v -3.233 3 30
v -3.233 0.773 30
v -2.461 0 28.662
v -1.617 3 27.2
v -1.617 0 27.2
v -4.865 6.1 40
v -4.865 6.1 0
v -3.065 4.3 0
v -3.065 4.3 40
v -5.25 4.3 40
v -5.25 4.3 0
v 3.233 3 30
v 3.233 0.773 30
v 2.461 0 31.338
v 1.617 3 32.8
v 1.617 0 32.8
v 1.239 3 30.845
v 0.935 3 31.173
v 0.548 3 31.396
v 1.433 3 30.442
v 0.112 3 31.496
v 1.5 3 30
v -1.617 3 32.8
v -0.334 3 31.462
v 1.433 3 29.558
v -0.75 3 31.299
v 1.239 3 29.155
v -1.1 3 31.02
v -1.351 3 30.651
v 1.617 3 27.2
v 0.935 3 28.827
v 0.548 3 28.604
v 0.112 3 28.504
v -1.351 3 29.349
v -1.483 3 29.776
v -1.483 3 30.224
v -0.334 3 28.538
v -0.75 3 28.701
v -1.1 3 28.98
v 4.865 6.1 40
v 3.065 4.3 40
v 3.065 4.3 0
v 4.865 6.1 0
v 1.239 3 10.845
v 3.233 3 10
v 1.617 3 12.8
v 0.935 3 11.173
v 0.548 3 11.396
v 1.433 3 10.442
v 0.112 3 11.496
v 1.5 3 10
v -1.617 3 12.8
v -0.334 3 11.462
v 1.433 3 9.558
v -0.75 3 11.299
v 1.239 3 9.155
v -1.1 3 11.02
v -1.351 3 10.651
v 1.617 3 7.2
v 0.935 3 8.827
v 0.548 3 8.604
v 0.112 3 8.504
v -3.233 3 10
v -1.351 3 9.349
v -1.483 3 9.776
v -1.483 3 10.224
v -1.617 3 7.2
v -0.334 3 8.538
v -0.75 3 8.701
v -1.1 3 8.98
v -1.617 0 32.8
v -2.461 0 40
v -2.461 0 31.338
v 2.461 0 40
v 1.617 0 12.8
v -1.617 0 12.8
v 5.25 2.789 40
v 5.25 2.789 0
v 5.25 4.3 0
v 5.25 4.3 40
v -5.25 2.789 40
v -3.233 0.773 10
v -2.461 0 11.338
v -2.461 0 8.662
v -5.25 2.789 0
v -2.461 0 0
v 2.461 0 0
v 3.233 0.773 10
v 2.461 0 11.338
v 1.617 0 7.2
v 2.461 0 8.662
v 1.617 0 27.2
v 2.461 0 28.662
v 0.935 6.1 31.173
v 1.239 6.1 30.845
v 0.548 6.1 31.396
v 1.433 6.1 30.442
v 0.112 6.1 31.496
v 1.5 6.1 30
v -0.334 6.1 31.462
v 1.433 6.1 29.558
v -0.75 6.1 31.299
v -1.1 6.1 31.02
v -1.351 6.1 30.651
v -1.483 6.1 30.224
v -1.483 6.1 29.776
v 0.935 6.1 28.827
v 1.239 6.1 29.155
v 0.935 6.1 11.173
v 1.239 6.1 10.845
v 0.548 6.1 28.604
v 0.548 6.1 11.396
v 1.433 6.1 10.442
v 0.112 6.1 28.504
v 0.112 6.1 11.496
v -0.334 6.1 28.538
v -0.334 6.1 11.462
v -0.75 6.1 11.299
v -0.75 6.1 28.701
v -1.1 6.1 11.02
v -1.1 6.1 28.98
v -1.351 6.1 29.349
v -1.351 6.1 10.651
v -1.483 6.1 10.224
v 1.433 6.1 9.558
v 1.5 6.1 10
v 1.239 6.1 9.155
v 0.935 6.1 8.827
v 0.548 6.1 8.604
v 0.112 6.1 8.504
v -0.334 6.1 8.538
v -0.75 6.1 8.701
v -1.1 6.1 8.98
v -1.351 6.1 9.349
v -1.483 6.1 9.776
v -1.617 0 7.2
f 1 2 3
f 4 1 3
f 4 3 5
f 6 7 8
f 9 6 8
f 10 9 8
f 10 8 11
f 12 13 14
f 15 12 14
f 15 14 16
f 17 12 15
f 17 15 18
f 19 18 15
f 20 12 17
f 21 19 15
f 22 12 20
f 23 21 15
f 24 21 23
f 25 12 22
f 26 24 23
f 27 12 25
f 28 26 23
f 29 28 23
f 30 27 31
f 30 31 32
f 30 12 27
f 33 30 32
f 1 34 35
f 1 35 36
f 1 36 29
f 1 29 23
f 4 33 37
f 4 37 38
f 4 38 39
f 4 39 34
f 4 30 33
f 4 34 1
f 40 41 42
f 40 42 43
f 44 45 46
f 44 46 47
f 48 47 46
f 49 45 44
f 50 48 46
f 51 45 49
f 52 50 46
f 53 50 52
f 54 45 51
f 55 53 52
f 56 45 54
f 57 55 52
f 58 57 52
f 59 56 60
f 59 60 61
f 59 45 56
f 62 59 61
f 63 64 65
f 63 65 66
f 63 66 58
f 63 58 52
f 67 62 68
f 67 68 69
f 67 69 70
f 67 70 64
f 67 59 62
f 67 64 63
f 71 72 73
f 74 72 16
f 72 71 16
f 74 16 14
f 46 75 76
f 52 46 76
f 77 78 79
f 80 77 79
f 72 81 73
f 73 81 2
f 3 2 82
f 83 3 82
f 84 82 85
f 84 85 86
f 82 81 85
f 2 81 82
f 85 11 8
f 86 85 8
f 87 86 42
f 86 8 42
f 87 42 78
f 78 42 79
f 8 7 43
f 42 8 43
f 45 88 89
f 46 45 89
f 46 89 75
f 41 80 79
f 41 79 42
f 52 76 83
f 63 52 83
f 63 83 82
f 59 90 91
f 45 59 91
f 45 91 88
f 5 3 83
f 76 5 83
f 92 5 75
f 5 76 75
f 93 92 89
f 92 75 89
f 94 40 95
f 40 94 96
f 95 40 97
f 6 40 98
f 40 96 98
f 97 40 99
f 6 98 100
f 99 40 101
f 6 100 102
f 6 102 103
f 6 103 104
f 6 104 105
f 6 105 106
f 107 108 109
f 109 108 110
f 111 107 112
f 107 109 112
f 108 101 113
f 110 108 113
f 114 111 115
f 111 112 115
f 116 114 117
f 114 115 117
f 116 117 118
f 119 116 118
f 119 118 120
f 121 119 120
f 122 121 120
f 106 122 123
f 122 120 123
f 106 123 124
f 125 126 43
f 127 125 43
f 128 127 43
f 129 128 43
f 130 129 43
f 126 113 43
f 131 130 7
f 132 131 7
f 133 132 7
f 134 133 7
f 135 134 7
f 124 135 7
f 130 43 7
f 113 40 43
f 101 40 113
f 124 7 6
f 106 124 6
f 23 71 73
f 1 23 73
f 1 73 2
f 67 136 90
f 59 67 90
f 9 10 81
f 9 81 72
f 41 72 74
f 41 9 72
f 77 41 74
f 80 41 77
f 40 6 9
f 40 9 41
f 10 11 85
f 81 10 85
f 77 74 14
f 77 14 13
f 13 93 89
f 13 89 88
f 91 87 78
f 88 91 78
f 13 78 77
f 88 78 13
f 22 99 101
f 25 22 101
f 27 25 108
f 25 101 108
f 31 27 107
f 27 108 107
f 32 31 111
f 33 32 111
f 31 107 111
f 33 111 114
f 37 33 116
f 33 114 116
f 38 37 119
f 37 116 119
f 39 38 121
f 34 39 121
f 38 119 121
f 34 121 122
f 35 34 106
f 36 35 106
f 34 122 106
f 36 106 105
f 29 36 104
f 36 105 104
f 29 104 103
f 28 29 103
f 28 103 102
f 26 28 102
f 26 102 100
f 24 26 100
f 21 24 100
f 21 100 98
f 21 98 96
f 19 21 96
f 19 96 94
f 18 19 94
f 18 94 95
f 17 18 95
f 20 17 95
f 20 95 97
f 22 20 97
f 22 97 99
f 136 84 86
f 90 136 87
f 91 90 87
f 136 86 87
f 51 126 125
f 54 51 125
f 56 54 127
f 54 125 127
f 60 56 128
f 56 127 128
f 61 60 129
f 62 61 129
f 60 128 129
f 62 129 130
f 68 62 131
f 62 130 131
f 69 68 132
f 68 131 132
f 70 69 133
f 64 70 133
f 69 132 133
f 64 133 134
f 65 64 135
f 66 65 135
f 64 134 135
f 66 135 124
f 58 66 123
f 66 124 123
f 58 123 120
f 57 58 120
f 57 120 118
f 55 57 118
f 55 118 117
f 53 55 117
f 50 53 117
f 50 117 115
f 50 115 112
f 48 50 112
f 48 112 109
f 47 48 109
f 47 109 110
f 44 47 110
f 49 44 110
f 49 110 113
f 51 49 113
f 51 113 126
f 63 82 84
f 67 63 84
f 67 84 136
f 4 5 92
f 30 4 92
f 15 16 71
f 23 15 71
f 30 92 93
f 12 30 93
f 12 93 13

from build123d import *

# Parameters (mm, degrees)
BOSS_EXTRUDE1_DEPTH = 40
SKETCH2_R           = 1.5
CUT_EXTRUDE1_DEPTH  = 7.1
CUT_EXTRUDE3_DEPTH  = 3


with BuildPart() as part:
    # Sketch1 → Boss-Extrude1 (new body)
    with BuildSketch(Plane.XY):
        Polygon((-2.460653528, 0), (2.460653528, 0), (5.25, 2.789346472), (5.25, 4.3), (3.065, 4.3), (4.865, 6.1), (-4.865, 6.1), (-3.065, 4.3), (-5.25, 4.3), (-5.25, 2.789346472), align=None)
    extrude(amount=BOSS_EXTRUDE1_DEPTH)

    # Sketch2 → Cut-Extrude1 (cut, through all)
    with BuildSketch(Plane(origin=(0, 6.1, 0), x_dir=(1, 0, 0), z_dir=(0, 1, 0))):
        with Locations((0, -30)):
            Circle(SKETCH2_R)
        with Locations((0, -10)):
            Circle(SKETCH2_R)
    extrude(amount=-CUT_EXTRUDE1_DEPTH, mode=Mode.SUBTRACT)

    # Sketch5 → Cut-Extrude3 (cut)
    with BuildSketch(Plane(origin=(0, 0, 0), x_dir=(-1, 0, 0), z_dir=(0, -1, 0))):
        Polygon((-3.233161507, -10), (-1.616580754, -12.8), (1.616580754, -12.8), (3.233161507, -10), (1.616580754, -7.2), (-1.616580754, -7.2), align=None)
        Polygon((-3.233161507, -30), (-1.616580754, -32.8), (1.616580754, -32.8), (3.233161507, -30), (1.616580754, -27.2), (-1.616580754, -27.2), align=None)
    extrude(amount=-CUT_EXTRUDE3_DEPTH, mode=Mode.SUBTRACT)


solid = part.part
